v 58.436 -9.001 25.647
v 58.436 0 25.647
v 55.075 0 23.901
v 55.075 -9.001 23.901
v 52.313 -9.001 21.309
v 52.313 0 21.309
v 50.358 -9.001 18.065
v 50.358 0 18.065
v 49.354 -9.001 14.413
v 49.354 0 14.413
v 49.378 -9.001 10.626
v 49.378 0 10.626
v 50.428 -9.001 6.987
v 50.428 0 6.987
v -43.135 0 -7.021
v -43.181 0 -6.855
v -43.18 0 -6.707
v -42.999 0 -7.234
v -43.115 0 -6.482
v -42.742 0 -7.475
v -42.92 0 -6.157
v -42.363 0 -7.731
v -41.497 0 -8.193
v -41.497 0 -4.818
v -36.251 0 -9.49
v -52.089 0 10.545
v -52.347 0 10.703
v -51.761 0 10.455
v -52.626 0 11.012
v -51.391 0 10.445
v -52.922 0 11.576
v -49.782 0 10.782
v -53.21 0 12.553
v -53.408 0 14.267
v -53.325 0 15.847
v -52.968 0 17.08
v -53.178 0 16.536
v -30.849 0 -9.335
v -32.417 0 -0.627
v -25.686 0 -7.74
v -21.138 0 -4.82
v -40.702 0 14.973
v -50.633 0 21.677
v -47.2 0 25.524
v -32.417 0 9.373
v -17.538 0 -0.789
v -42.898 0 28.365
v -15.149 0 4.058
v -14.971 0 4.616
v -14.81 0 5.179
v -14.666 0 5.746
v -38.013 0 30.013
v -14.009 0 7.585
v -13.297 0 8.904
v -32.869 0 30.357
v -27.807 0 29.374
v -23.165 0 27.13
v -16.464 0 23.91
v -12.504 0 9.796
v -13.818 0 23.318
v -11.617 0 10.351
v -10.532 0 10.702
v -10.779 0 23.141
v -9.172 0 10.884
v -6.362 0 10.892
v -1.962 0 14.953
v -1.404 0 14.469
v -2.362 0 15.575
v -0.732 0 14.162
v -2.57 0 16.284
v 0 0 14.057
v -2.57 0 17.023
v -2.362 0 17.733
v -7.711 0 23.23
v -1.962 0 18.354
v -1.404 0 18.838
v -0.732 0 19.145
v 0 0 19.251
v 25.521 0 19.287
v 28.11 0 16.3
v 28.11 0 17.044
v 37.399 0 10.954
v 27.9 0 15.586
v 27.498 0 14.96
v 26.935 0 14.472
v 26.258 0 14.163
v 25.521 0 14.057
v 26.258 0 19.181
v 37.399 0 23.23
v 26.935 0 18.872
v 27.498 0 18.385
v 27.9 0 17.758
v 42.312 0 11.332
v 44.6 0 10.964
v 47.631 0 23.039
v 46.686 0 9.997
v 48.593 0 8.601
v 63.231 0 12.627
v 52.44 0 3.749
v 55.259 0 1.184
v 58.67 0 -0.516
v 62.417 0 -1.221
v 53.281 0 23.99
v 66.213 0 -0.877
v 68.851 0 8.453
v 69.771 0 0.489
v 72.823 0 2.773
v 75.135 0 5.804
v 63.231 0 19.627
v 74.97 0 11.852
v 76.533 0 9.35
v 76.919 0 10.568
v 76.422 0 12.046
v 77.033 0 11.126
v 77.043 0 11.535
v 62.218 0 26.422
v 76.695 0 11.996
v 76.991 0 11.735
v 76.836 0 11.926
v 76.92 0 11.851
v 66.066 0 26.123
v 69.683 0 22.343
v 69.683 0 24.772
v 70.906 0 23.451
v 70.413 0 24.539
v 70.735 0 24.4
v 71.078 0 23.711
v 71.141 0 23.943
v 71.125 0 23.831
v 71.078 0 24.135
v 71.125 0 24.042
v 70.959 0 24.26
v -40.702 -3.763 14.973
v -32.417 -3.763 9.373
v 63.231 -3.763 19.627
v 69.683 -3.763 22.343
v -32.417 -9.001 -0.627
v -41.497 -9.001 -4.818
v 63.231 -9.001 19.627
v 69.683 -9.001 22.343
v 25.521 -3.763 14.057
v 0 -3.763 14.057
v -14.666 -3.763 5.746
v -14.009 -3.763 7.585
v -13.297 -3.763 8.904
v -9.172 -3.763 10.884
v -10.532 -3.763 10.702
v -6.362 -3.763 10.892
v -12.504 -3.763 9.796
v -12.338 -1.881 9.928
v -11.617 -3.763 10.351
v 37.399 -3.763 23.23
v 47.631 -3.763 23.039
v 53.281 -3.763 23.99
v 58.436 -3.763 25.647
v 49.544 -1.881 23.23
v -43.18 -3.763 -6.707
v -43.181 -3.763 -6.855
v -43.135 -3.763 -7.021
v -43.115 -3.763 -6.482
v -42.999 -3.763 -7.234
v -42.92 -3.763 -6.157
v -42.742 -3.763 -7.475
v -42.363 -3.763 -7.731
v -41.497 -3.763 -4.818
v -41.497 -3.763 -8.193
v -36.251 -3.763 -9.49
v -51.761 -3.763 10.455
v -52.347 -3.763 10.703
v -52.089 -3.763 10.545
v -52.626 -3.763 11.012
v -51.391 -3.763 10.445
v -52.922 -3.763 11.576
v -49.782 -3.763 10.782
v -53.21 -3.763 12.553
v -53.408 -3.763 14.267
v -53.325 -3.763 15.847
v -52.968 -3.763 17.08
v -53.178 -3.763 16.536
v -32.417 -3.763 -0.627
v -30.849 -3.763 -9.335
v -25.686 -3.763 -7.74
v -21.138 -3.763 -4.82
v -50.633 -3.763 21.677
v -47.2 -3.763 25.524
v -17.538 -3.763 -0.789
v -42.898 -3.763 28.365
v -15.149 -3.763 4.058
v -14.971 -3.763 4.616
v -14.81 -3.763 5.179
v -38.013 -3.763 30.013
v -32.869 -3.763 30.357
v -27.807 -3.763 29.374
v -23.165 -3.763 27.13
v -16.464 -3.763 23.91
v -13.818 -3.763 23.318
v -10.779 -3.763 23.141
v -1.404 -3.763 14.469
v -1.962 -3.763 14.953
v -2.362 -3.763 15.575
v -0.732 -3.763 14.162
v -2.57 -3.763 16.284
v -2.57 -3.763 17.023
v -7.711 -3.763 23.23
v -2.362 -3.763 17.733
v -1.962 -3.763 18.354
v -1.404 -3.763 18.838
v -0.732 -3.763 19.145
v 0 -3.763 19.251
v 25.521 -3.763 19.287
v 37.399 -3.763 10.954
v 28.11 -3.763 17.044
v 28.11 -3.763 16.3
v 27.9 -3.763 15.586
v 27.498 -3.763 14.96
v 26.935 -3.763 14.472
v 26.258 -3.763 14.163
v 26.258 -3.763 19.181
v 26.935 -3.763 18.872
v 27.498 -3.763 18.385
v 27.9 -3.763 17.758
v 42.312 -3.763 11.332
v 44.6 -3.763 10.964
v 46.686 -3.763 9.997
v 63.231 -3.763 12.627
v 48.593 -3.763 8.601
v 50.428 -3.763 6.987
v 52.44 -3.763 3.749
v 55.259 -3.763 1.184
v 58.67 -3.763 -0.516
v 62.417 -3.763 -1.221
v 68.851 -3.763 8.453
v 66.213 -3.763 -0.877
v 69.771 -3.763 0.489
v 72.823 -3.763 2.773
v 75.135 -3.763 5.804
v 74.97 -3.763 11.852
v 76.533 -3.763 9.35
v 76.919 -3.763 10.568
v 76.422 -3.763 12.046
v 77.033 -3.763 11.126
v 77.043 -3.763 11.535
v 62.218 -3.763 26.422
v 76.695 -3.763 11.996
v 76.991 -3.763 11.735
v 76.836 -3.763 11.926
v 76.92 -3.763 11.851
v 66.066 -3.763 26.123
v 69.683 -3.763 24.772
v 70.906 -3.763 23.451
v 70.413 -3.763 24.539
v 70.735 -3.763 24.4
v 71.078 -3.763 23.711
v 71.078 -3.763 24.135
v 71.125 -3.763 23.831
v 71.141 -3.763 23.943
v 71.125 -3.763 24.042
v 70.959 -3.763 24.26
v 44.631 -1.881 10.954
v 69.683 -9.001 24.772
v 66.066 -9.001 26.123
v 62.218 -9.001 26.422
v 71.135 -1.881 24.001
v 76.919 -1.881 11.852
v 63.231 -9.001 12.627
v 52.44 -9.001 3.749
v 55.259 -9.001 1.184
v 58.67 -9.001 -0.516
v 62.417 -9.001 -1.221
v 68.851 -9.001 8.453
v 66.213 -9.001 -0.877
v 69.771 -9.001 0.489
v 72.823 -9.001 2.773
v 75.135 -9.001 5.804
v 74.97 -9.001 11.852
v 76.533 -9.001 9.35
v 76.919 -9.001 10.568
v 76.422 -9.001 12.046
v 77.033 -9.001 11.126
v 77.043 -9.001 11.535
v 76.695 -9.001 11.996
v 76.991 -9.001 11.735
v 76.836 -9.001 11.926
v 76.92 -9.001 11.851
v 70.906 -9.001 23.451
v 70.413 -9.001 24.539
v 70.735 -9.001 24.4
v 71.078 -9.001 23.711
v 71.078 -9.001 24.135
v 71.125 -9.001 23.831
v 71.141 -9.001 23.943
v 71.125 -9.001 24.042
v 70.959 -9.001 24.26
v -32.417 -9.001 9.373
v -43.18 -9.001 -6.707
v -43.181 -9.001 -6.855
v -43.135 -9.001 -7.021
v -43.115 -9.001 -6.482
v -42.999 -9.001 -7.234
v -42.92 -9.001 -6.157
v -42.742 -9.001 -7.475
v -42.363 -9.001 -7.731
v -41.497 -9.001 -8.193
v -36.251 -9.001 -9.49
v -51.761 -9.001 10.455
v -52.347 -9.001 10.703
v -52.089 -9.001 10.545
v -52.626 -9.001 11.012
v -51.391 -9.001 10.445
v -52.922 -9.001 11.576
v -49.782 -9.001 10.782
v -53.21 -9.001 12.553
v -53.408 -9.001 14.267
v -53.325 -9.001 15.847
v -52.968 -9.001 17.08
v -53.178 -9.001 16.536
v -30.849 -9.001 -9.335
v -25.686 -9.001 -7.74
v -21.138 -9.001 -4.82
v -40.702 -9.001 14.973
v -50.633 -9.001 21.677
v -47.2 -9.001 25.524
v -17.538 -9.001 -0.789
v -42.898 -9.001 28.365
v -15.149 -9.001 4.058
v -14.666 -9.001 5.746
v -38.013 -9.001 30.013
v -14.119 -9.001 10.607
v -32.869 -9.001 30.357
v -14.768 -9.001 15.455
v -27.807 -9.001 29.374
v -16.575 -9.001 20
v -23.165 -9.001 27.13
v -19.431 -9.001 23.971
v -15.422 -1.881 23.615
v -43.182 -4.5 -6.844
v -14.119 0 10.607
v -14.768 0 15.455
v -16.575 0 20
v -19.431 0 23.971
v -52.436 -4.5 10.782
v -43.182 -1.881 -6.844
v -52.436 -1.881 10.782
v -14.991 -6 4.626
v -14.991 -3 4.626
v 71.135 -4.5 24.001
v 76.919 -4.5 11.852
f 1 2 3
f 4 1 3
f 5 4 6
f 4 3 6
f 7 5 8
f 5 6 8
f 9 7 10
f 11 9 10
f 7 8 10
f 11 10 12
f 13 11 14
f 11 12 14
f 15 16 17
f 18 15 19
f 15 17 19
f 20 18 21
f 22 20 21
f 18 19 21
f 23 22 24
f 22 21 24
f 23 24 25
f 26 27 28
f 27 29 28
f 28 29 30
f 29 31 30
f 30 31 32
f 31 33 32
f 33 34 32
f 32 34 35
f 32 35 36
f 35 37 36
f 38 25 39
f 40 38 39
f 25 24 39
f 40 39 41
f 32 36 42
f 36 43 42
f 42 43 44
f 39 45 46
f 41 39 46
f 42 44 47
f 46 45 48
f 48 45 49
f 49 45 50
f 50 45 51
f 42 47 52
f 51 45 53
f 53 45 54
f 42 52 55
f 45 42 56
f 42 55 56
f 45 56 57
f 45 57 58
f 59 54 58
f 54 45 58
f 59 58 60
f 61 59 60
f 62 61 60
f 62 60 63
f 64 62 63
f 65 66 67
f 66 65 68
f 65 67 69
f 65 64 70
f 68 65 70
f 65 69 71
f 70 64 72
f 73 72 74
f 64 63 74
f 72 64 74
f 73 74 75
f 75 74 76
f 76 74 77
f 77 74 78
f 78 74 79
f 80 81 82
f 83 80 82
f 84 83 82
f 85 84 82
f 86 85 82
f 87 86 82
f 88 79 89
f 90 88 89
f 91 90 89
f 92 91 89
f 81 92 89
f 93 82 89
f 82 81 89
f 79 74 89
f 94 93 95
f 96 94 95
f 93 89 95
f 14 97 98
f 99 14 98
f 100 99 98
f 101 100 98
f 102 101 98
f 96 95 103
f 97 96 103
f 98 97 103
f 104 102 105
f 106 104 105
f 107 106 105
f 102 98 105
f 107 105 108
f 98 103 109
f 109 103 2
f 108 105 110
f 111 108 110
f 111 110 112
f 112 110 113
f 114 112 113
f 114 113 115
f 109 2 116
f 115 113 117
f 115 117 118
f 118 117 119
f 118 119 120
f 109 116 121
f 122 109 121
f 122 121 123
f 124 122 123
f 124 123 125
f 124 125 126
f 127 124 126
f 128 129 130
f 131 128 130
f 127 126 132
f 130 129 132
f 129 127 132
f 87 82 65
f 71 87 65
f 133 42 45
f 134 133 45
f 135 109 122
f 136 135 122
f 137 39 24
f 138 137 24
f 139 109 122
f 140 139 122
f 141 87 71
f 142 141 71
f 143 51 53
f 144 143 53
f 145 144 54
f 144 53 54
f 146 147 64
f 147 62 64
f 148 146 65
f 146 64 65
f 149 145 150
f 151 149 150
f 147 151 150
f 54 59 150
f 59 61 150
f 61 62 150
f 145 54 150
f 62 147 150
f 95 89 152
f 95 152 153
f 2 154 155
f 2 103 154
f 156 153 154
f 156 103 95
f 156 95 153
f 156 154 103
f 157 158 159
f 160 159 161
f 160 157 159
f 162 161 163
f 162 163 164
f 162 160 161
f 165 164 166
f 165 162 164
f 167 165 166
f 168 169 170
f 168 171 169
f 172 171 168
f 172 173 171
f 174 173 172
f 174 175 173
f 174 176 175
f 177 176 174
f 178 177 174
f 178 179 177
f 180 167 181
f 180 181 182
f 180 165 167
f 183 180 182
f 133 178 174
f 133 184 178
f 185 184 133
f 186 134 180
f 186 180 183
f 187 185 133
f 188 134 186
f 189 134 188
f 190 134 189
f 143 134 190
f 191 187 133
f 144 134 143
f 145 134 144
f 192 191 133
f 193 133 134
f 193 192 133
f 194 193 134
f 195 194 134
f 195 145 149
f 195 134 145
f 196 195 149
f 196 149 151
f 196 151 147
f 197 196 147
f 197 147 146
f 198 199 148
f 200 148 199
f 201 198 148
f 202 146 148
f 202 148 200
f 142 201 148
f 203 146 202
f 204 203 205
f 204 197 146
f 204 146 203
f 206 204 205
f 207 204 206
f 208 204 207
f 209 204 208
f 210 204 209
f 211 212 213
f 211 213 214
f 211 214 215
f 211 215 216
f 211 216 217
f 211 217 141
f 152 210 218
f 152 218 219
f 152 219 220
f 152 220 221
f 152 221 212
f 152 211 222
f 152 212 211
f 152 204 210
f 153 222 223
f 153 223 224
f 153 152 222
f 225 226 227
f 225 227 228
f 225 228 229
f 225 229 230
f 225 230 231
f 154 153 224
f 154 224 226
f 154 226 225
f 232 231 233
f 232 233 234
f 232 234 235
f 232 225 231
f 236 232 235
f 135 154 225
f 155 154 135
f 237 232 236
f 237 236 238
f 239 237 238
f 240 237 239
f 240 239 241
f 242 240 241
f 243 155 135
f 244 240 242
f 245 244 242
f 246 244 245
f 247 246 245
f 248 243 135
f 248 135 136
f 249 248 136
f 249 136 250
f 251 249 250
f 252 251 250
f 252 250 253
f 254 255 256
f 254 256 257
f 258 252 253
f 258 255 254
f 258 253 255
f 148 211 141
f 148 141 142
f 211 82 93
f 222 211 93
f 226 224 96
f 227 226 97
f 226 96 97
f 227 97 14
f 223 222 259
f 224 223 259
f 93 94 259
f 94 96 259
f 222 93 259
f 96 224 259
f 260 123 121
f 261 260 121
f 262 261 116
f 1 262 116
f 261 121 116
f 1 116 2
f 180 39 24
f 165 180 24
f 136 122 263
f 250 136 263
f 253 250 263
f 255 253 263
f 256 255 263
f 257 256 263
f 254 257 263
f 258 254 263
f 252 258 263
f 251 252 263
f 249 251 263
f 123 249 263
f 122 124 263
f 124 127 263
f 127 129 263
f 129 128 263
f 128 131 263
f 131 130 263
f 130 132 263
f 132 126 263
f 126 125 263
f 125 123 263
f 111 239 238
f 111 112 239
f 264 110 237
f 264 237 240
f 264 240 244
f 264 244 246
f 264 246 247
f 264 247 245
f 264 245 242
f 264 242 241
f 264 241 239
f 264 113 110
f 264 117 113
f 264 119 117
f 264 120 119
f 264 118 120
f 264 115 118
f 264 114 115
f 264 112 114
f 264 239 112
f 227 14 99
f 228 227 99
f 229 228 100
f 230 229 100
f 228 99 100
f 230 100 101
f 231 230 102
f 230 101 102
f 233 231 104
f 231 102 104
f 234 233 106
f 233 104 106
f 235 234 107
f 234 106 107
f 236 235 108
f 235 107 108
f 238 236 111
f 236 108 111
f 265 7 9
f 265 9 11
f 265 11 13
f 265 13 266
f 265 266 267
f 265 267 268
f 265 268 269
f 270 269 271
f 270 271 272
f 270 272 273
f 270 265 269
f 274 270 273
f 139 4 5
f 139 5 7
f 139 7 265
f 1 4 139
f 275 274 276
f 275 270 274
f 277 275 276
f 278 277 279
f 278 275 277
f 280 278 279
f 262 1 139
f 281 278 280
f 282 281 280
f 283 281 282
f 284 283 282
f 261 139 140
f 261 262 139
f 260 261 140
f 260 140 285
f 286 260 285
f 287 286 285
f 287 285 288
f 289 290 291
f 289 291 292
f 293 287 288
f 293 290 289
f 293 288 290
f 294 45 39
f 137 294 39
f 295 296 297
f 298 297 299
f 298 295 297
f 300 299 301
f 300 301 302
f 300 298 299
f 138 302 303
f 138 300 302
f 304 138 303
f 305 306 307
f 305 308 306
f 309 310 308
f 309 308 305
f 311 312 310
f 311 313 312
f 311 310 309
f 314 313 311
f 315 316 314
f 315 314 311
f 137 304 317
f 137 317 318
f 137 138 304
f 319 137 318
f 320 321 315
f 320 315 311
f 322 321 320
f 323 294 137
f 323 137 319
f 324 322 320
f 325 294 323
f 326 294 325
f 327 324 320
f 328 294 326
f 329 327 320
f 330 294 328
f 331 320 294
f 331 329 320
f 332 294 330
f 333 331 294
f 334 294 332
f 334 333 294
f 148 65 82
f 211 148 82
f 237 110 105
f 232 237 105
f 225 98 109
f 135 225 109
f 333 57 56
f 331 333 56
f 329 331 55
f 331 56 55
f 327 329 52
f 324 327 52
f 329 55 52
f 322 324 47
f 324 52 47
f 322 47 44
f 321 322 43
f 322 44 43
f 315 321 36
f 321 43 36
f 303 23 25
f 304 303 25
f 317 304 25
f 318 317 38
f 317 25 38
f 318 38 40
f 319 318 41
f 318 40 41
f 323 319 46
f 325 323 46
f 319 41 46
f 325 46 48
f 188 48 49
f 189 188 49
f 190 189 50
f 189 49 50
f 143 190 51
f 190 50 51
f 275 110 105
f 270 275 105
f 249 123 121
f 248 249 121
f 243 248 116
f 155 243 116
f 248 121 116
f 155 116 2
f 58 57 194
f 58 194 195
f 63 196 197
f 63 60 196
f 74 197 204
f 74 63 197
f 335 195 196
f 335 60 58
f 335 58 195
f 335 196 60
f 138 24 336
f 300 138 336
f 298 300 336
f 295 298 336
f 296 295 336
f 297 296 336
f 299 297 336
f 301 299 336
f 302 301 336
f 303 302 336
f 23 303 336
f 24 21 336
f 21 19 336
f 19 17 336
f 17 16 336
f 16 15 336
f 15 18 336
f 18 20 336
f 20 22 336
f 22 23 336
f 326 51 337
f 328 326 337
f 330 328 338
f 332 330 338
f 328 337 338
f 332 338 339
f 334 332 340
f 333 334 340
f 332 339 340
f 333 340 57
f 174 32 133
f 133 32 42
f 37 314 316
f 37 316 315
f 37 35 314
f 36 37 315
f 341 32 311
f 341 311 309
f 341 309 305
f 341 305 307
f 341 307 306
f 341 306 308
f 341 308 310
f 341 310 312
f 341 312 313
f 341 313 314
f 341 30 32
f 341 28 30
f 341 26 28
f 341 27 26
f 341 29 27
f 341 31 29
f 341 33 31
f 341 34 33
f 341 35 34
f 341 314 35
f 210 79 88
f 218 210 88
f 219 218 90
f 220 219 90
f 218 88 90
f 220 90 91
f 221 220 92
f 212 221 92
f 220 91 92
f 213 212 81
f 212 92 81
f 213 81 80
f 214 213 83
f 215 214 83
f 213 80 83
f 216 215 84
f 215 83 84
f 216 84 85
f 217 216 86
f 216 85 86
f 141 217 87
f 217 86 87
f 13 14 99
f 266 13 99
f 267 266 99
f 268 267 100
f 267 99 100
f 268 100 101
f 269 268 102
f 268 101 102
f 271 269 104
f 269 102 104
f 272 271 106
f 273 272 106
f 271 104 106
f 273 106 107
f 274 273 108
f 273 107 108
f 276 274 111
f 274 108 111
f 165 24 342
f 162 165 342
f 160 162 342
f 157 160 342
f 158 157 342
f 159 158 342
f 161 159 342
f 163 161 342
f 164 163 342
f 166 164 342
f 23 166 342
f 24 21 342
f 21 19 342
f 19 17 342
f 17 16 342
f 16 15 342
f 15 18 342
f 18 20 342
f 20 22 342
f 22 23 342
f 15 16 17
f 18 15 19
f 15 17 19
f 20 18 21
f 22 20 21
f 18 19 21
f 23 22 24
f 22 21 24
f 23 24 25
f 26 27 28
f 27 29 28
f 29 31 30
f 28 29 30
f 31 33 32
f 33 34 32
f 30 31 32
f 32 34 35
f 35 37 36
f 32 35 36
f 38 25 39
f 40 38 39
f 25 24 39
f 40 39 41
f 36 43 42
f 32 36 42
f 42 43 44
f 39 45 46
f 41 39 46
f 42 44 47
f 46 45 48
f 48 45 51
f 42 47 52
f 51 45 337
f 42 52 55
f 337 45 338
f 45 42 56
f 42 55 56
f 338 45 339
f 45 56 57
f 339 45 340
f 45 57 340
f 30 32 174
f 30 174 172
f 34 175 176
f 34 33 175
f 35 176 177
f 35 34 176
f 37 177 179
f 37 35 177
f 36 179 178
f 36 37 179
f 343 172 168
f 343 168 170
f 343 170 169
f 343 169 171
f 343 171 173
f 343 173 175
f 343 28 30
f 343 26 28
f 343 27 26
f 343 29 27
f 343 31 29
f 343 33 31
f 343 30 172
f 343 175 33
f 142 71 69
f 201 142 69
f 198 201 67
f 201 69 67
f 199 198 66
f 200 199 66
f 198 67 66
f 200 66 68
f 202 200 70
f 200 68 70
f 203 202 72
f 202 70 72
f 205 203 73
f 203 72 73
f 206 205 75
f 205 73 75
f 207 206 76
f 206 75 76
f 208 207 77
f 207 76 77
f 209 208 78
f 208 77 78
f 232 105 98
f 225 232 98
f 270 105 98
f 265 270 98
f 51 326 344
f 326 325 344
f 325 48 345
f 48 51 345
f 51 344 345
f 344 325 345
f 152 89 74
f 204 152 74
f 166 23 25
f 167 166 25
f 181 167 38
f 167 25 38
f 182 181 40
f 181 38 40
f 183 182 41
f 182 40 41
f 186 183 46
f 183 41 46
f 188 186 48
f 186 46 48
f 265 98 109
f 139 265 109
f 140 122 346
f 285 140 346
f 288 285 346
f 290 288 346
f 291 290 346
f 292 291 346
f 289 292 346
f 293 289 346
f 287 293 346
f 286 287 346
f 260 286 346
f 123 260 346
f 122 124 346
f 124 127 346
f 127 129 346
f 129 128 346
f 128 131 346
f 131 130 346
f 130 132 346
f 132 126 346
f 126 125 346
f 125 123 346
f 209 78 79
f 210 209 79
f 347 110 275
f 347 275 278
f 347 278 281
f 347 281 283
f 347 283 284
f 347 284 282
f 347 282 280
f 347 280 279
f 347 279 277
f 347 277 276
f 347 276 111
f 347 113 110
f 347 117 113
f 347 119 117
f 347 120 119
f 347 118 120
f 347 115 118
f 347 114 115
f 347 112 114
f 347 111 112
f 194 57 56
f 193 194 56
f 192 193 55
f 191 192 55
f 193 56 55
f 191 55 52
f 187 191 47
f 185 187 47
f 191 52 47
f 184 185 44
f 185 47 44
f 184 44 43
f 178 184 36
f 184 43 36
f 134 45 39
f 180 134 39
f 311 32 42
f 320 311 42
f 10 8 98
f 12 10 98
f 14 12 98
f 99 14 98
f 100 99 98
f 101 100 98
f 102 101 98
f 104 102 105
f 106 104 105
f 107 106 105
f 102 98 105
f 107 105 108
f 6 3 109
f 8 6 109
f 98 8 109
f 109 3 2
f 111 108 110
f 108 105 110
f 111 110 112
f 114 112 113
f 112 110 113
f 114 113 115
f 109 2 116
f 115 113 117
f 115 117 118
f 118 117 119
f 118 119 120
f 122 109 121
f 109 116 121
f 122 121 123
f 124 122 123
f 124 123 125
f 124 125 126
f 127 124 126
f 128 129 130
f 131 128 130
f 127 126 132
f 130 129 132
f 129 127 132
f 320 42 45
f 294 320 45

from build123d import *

# Parameters (mm, degrees)
F1_DEPTH = 9.00061
F2_DEPTH = 3.76264


with BuildPart() as f1:
    # F0 (on Front) → F1 (new body)
    with BuildSketch(Plane.XZ):
        with BuildLine():
            Line((-40.7024563674, 14.972725965), (-32.4174099998, 9.3729039422))
            Line((-32.4174099998, 9.3729039422), (-32.4174099998, -0.6270960578))
            Line((-32.4174099998, -0.6270960578), (-41.4970039682, -4.8176775649))
            add(Edge.make_bspline(
                [(-41.4970039682, -4.8176775649), (-42.3691302595, -5.5398068022), (-44.0306487903, -6.9155606595), (-42.3130432889, -7.7816184293), (-41.4970039682, -8.1930849701)],
                knots=[0, 0, 0, 0, 0.5248971198, 1, 1, 1, 1], degree=3))
            ThreePointArc((-41.4970039682, -8.1930849701), (-25.6855662565, -7.7395513117), (-15.1487593399, 4.0580312922))
            add(Edge.make_bspline(
                [(-15.1487593399, 4.0580312922), (-14.9911543333, 4.626323008), (-14.834256946, 5.1948774111), (-14.6659208594, 5.7464616678)],
                knots=[0, 0, 0, 0, 0.1221985557, 0.1221985557, 0.1221985557, 0.1221985557], degree=3))
            ThreePointArc((-14.6659208594, 5.7464616678), (-15.5322726984, 17.7831315263), (-23.1653100131, 27.1302555838))
            ThreePointArc((-23.1653100131, 27.1302555838), (-40.5089119394, 29.3473052437), (-52.9679948246, 17.0799872552))
            add(Edge.make_bspline(
                [(-49.7820503358, 10.7821444579), (-50.7407984354, 10.6016786924), (-53.3237116879, 9.3564932455), (-53.7318373751, 15.6123015952), (-52.9679948246, 17.0799872552)],
                knots=[0, 0, 0, 0, 0.3931938838, 1, 1, 1, 1], degree=3))
            Line((-49.7820503358, 10.7821444579), (-40.7024563674, 14.972725965))
        make_face()
    extrude(amount=F1_DEPTH)


with BuildPart() as f1b:
    # F0 (on Front) → F1, piece 2 (new body)
    with BuildSketch(Plane.XZ):
        with BuildLine():
            ThreePointArc((69.6827814383, 24.7720330954), (64.1525250072, 26.4072548887), (58.4358809411, 25.6472107261))
            ThreePointArc((58.4358809411, 25.6472107261), (50.357658925, 18.0653870977), (50.4275333835, 6.9867212017))
            ThreePointArc((50.4275333835, 6.9867212017), (64.3265241083, -1.180478153), (76.533049345, 9.3497559428))
            add(Edge.make_bspline(
                [(74.9696431023, 11.8522195277), (75.7974487836, 12.0232266624), (77.5687880184, 12.389147861), (76.8930125062, 10.4060736713), (76.533049345, 9.3497559428)],
                knots=[0, 0, 0, 0, 0.4673332273, 1, 1, 1, 1], degree=3))
            Line((74.9696431023, 11.8522195277), (68.8505408138, 8.4527214496))
            Line((68.8505408138, 8.4527214496), (63.2313340902, 12.6269897446))
            Line((63.2313340902, 12.6269897446), (63.2313340902, 19.6269897446))
            Line((63.2313340902, 19.6269897446), (69.6827814383, 22.343389405))
            add(Edge.make_bspline(
                [(69.6827814383, 22.343389405), (70.4471865954, 22.9642941163), (71.8718948949, 24.1215444136), (70.3760526911, 24.5660295637), (69.6827814383, 24.7720330954)],
                knots=[0, 0, 0, 0, 0.5365345014, 1, 1, 1, 1], degree=3))
        make_face()
    extrude(amount=F1_DEPTH)


with BuildPart() as f2:
    # F0 (on Front) → F2 (new body)
    with BuildSketch(Plane.XZ):
        with BuildLine():
            Line((-40.7024563674, 14.972725965), (-32.4174099998, 9.3729039422))
            Line((-32.4174099998, 9.3729039422), (-32.4174099998, -0.6270960578))
            Line((-32.4174099998, -0.6270960578), (-41.4970039682, -4.8176775649))
            add(Edge.make_bspline(
                [(-41.4970039682, -4.8176775649), (-42.3691302595, -5.5398068022), (-44.0306487903, -6.9155606595), (-42.3130432889, -7.7816184293), (-41.4970039682, -8.1930849701)],
                knots=[0, 0, 0, 0, 0.5248971198, 1, 1, 1, 1], degree=3))
            ThreePointArc((-41.4970039682, -8.1930849701), (-25.6855662565, -7.7395513117), (-15.1487593399, 4.0580312922))
            add(Edge.make_bspline(
                [(-15.1487593399, 4.0580312922), (-14.9911543333, 4.626323008), (-14.834256946, 5.1948774111), (-14.6659208594, 5.7464616678)],
                knots=[0, 0, 0, 0, 0.1221985557, 0.1221985557, 0.1221985557, 0.1221985557], degree=3))
            ThreePointArc((-14.6659208594, 5.7464616678), (-15.5322726984, 17.7831315263), (-23.1653100131, 27.1302555838))
            ThreePointArc((-23.1653100131, 27.1302555838), (-40.5089119394, 29.3473052437), (-52.9679948246, 17.0799872552))
            add(Edge.make_bspline(
                [(-49.7820503358, 10.7821444579), (-50.7407984354, 10.6016786924), (-53.3237116879, 9.3564932455), (-53.7318373751, 15.6123015952), (-52.9679948246, 17.0799872552)],
                knots=[0, 0, 0, 0, 0.3931938838, 1, 1, 1, 1], degree=3))
            Line((-49.7820503358, 10.7821444579), (-40.7024563674, 14.972725965))
        make_face()
        with BuildLine():
            add(Edge.make_bspline(
                [(-15.1487593399, 4.0580312922), (-14.9911543333, 4.626323008), (-14.834256946, 5.1948774111), (-14.6659208594, 5.7464616678)],
                knots=[0, 0, 0, 0, 0.1221985557, 0.1221985557, 0.1221985557, 0.1221985557], degree=3))
            ThreePointArc((-15.1487593399, 4.0580312922), (-14.8887994537, 4.8969444329), (-14.6659208594, 5.7464616678))
        make_face()
        with BuildLine():
            add(Edge.make_bspline(
                [(-23.1653100131, 27.1302555838), (-20.6106764356, 25.698985463), (-15.6338752189, 22.883416186), (-10.3081934592, 23.1184194817), (-7.7111385763, 23.22980389)],
                knots=[0, 0, 0, 0, 0.5120676854, 1, 1, 1, 1], degree=3))
            ThreePointArc((-23.1653100131, 27.1302555838), (-15.5322726984, 17.7831315263), (-14.6659208594, 5.7464616678))
            add(Edge.make_bspline(
                [(-14.6659208594, 5.7464616678), (-14.1329973594, 7.492683875), (-12.6636390156, 11.0690102763), (-8.6197958598, 10.9544845005), (-6.3616898842, 10.8919832855)],
                knots=[0.1221985557, 0.1221985557, 0.1221985557, 0.1221985557, 0.509058458, 1, 1, 1, 1], degree=3))
            Line((-6.3616898842, 10.8919832855), (37.399020046, 10.9544845005))
            add(Edge.make_bspline(
                [(37.399020046, 10.9544845005), (39.9231013855, 11.292431535), (44.9347389366, 11.9634352866), (48.6055195273, 8.637546134), (50.4275333835, 6.9867212017)],
                knots=[0, 0, 0, 0, 0.5036440313, 1, 1, 1, 1], degree=3))
            ThreePointArc((50.4275333835, 6.9867212017), (50.357658925, 18.0653870977), (58.4358809411, 25.6472107261))
            add(Edge.make_bspline(
                [(37.399020046, 23.22980389), (41.619609059, 22.9837986409), (49.518339794, 22.5167302219), (55.6012471555, 24.6586811727), (58.4358809411, 25.6472107261)],
                knots=[0, 0, 0, 0, 0.5344622564, 1, 1, 1, 1], degree=3))
            Line((37.399020046, 23.22980389), (-7.7111385763, 23.22980389))
        make_face()
        with BuildLine():
            ThreePointArc((0, 14.0572730452), (-2.5966381654, 16.6539112106), (0, 19.250549376))
            Line((0, 19.250549376), (25.5213363633, 19.2870002136))
            ThreePointArc((25.5213363633, 19.2870002136), (28.1361999475, 16.6721366294), (25.5213363633, 14.0572730452))
            Line((25.5213363633, 14.0572730452), (0, 14.0572730452))
        make_face(mode=Mode.SUBTRACT)
        with BuildLine():
            ThreePointArc((69.6827814383, 24.7720330954), (64.1525250072, 26.4072548887), (58.4358809411, 25.6472107261))
            ThreePointArc((58.4358809411, 25.6472107261), (50.357658925, 18.0653870977), (50.4275333835, 6.9867212017))
            ThreePointArc((50.4275333835, 6.9867212017), (64.3265241083, -1.180478153), (76.533049345, 9.3497559428))
            add(Edge.make_bspline(
                [(74.9696431023, 11.8522195277), (75.7974487836, 12.0232266624), (77.5687880184, 12.389147861), (76.8930125062, 10.4060736713), (76.533049345, 9.3497559428)],
                knots=[0, 0, 0, 0, 0.4673332273, 1, 1, 1, 1], degree=3))
            Line((74.9696431023, 11.8522195277), (68.8505408138, 8.4527214496))
            Line((68.8505408138, 8.4527214496), (63.2313340902, 12.6269897446))
            Line((63.2313340902, 12.6269897446), (63.2313340902, 19.6269897446))
            Line((63.2313340902, 19.6269897446), (69.6827814383, 22.343389405))
            add(Edge.make_bspline(
                [(69.6827814383, 22.343389405), (70.4471865954, 22.9642941163), (71.8718948949, 24.1215444136), (70.3760526911, 24.5660295637), (69.6827814383, 24.7720330954)],
                knots=[0, 0, 0, 0, 0.5365345014, 1, 1, 1, 1], degree=3))
        make_face()
    extrude(amount=F2_DEPTH)


solid = Compound([f1.part, f1b.part, f2.part])
